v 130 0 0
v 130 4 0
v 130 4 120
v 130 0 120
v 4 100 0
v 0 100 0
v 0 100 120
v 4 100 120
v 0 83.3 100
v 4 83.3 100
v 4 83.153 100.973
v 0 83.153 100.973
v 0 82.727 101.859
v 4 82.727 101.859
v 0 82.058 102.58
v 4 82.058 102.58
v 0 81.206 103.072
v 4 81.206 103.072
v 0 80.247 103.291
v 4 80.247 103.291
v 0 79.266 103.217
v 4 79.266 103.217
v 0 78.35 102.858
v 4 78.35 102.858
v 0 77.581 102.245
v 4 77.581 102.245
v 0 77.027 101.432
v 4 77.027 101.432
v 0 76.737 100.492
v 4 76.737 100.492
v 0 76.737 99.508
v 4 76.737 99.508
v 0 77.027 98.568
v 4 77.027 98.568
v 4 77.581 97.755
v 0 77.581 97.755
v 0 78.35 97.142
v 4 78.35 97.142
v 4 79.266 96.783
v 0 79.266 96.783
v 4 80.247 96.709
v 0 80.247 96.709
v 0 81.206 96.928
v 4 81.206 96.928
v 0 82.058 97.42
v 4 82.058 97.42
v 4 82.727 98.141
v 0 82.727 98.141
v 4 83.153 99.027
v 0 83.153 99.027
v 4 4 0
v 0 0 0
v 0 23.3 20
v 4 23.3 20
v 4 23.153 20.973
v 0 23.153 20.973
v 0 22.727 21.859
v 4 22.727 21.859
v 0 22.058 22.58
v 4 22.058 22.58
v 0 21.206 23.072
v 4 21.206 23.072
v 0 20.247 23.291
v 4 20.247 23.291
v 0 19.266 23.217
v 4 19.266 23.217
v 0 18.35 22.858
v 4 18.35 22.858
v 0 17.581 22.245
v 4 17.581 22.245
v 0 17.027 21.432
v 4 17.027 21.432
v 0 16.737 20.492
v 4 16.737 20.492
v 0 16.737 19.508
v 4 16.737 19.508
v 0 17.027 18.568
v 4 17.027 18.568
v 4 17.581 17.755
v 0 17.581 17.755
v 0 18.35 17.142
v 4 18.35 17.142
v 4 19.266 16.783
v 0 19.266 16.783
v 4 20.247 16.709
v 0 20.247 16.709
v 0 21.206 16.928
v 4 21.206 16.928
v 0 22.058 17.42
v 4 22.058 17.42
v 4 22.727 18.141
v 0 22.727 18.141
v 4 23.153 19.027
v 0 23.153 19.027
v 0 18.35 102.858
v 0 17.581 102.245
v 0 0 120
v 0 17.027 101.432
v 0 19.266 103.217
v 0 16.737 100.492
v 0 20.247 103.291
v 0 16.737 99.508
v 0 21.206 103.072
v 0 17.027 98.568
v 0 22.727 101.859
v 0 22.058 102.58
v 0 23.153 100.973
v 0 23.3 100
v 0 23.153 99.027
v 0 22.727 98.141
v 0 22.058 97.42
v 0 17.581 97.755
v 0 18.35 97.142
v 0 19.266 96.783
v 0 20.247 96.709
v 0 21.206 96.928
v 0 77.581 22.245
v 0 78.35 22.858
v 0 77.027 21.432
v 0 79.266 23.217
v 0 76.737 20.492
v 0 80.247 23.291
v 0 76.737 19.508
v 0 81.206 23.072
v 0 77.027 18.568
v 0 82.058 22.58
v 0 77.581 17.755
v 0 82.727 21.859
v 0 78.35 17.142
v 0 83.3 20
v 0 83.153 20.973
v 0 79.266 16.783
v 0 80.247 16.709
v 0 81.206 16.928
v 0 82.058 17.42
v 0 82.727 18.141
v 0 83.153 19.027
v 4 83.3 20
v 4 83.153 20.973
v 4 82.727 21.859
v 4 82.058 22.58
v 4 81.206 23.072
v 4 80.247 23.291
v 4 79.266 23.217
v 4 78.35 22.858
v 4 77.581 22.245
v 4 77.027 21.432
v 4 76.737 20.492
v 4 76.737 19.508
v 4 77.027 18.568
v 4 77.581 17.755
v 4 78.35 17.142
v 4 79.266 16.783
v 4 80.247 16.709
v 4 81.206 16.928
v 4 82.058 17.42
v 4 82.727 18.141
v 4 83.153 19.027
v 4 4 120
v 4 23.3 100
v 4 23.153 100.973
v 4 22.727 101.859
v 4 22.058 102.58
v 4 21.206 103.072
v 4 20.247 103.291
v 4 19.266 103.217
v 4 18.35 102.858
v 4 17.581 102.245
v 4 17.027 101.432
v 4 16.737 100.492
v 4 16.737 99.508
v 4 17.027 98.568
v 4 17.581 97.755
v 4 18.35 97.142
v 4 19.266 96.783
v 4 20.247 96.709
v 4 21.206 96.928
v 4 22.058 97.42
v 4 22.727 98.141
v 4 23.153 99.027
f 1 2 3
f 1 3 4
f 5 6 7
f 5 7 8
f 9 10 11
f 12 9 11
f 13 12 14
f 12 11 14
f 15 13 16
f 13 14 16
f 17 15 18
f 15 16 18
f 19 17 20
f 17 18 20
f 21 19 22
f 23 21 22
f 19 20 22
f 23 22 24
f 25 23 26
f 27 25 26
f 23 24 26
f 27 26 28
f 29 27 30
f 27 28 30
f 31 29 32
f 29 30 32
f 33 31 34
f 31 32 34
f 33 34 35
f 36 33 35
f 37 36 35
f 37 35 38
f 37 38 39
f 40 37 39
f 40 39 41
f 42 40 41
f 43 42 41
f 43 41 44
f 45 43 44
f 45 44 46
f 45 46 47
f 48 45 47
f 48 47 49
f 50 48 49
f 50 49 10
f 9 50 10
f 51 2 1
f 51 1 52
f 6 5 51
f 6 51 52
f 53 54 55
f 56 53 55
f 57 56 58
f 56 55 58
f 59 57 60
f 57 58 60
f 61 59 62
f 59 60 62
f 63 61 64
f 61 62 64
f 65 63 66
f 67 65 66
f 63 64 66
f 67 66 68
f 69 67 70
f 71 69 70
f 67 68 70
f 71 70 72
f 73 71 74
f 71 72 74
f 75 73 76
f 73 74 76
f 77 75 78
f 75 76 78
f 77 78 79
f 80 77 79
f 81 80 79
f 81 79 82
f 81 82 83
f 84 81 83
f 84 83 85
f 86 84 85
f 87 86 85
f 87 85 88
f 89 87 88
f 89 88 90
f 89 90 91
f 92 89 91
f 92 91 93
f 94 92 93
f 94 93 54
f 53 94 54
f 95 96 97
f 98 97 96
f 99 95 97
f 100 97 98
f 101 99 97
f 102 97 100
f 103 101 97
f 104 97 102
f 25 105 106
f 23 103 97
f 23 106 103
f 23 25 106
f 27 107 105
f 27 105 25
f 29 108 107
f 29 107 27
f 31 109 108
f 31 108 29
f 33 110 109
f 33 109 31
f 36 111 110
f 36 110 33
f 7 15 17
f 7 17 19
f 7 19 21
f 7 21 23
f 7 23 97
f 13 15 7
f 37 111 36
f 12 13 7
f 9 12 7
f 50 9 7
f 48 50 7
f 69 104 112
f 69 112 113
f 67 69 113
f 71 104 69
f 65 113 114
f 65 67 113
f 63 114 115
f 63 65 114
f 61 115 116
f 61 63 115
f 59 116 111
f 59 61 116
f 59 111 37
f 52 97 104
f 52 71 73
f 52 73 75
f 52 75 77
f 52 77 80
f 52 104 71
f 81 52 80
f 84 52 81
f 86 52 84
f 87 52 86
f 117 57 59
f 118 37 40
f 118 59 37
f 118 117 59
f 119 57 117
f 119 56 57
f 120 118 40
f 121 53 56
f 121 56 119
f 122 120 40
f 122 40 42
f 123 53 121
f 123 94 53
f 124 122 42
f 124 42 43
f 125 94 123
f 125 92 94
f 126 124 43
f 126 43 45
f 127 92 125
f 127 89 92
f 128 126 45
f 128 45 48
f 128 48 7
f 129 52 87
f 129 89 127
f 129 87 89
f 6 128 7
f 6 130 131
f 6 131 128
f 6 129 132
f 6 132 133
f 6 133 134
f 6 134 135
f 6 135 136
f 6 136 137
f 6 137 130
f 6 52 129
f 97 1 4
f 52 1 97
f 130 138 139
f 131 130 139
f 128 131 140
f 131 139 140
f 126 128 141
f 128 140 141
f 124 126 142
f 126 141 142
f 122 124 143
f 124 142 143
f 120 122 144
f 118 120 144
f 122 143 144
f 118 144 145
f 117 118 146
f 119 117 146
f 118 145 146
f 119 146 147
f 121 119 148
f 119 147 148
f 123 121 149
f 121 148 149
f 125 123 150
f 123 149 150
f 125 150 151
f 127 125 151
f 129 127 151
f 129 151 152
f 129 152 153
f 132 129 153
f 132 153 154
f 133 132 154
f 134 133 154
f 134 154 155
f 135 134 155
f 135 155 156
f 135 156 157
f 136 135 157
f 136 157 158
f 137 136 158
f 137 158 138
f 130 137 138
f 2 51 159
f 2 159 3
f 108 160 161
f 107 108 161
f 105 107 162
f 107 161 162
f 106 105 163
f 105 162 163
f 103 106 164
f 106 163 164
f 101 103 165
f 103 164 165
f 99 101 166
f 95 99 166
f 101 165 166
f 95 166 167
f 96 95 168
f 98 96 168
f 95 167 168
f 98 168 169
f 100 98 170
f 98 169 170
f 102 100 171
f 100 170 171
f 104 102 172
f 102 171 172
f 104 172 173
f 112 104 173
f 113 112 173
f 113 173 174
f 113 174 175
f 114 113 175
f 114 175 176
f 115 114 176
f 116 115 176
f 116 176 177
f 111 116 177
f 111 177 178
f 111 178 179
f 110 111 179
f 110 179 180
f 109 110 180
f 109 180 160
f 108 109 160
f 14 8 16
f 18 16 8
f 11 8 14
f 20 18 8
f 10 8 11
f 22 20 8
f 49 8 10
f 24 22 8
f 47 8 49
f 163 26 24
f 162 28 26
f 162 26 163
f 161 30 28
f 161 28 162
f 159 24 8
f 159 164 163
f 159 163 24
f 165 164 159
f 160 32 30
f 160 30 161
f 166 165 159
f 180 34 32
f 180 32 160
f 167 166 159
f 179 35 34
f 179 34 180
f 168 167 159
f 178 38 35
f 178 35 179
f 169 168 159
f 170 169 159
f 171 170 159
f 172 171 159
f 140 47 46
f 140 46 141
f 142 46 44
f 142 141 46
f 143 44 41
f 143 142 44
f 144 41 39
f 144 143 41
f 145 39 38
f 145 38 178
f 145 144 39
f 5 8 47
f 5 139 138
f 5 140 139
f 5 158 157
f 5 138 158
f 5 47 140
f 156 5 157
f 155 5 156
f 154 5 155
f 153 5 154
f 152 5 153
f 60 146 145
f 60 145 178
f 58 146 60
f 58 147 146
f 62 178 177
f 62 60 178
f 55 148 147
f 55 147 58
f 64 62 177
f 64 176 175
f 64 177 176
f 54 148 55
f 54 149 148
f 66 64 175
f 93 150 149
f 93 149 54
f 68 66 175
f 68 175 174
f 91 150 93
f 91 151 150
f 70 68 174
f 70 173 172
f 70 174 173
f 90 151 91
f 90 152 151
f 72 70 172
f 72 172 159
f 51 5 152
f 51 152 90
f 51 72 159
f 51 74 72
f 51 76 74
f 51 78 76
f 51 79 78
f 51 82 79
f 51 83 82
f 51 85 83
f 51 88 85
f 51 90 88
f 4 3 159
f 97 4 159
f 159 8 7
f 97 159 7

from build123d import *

# Parameters (mm, degrees)
BOSS_EXTRUDE1_DEPTH = 120
SKETCH4_R           = 3.3
CUT_EXTRUDE1_DEPTH  = 201.688813839


with BuildPart() as part:
    # Sketch2 → Boss-Extrude1 (new body)
    with BuildSketch(Plane.XY):
        Polygon((0, 0), (0, 100), (4, 100), (4, 4), (130, 4), (130, 0), align=None)
    extrude(amount=BOSS_EXTRUDE1_DEPTH)

    # Sketch4 → Cut-Extrude1 (cut, through all)
    with BuildSketch(Plane(origin=(4, 0, 0), x_dir=(0, 0, -1), z_dir=(1, 0, 0))):
        with Locations(Location((-100, 80, 0), (0, 0, 90))):
            Circle(SKETCH4_R)
        with Locations(Location((-20, 80, 0), (0, 0, 90))):
            Circle(SKETCH4_R)
        with Locations(Location((-20, 20, 0), (0, 0, 90))):
            Circle(SKETCH4_R)
        with Locations(Location((-100, 20, 0), (0, 0, 90))):
            Circle(SKETCH4_R)
    extrude(amount=-CUT_EXTRUDE1_DEPTH, mode=Mode.SUBTRACT)


solid = part.part
